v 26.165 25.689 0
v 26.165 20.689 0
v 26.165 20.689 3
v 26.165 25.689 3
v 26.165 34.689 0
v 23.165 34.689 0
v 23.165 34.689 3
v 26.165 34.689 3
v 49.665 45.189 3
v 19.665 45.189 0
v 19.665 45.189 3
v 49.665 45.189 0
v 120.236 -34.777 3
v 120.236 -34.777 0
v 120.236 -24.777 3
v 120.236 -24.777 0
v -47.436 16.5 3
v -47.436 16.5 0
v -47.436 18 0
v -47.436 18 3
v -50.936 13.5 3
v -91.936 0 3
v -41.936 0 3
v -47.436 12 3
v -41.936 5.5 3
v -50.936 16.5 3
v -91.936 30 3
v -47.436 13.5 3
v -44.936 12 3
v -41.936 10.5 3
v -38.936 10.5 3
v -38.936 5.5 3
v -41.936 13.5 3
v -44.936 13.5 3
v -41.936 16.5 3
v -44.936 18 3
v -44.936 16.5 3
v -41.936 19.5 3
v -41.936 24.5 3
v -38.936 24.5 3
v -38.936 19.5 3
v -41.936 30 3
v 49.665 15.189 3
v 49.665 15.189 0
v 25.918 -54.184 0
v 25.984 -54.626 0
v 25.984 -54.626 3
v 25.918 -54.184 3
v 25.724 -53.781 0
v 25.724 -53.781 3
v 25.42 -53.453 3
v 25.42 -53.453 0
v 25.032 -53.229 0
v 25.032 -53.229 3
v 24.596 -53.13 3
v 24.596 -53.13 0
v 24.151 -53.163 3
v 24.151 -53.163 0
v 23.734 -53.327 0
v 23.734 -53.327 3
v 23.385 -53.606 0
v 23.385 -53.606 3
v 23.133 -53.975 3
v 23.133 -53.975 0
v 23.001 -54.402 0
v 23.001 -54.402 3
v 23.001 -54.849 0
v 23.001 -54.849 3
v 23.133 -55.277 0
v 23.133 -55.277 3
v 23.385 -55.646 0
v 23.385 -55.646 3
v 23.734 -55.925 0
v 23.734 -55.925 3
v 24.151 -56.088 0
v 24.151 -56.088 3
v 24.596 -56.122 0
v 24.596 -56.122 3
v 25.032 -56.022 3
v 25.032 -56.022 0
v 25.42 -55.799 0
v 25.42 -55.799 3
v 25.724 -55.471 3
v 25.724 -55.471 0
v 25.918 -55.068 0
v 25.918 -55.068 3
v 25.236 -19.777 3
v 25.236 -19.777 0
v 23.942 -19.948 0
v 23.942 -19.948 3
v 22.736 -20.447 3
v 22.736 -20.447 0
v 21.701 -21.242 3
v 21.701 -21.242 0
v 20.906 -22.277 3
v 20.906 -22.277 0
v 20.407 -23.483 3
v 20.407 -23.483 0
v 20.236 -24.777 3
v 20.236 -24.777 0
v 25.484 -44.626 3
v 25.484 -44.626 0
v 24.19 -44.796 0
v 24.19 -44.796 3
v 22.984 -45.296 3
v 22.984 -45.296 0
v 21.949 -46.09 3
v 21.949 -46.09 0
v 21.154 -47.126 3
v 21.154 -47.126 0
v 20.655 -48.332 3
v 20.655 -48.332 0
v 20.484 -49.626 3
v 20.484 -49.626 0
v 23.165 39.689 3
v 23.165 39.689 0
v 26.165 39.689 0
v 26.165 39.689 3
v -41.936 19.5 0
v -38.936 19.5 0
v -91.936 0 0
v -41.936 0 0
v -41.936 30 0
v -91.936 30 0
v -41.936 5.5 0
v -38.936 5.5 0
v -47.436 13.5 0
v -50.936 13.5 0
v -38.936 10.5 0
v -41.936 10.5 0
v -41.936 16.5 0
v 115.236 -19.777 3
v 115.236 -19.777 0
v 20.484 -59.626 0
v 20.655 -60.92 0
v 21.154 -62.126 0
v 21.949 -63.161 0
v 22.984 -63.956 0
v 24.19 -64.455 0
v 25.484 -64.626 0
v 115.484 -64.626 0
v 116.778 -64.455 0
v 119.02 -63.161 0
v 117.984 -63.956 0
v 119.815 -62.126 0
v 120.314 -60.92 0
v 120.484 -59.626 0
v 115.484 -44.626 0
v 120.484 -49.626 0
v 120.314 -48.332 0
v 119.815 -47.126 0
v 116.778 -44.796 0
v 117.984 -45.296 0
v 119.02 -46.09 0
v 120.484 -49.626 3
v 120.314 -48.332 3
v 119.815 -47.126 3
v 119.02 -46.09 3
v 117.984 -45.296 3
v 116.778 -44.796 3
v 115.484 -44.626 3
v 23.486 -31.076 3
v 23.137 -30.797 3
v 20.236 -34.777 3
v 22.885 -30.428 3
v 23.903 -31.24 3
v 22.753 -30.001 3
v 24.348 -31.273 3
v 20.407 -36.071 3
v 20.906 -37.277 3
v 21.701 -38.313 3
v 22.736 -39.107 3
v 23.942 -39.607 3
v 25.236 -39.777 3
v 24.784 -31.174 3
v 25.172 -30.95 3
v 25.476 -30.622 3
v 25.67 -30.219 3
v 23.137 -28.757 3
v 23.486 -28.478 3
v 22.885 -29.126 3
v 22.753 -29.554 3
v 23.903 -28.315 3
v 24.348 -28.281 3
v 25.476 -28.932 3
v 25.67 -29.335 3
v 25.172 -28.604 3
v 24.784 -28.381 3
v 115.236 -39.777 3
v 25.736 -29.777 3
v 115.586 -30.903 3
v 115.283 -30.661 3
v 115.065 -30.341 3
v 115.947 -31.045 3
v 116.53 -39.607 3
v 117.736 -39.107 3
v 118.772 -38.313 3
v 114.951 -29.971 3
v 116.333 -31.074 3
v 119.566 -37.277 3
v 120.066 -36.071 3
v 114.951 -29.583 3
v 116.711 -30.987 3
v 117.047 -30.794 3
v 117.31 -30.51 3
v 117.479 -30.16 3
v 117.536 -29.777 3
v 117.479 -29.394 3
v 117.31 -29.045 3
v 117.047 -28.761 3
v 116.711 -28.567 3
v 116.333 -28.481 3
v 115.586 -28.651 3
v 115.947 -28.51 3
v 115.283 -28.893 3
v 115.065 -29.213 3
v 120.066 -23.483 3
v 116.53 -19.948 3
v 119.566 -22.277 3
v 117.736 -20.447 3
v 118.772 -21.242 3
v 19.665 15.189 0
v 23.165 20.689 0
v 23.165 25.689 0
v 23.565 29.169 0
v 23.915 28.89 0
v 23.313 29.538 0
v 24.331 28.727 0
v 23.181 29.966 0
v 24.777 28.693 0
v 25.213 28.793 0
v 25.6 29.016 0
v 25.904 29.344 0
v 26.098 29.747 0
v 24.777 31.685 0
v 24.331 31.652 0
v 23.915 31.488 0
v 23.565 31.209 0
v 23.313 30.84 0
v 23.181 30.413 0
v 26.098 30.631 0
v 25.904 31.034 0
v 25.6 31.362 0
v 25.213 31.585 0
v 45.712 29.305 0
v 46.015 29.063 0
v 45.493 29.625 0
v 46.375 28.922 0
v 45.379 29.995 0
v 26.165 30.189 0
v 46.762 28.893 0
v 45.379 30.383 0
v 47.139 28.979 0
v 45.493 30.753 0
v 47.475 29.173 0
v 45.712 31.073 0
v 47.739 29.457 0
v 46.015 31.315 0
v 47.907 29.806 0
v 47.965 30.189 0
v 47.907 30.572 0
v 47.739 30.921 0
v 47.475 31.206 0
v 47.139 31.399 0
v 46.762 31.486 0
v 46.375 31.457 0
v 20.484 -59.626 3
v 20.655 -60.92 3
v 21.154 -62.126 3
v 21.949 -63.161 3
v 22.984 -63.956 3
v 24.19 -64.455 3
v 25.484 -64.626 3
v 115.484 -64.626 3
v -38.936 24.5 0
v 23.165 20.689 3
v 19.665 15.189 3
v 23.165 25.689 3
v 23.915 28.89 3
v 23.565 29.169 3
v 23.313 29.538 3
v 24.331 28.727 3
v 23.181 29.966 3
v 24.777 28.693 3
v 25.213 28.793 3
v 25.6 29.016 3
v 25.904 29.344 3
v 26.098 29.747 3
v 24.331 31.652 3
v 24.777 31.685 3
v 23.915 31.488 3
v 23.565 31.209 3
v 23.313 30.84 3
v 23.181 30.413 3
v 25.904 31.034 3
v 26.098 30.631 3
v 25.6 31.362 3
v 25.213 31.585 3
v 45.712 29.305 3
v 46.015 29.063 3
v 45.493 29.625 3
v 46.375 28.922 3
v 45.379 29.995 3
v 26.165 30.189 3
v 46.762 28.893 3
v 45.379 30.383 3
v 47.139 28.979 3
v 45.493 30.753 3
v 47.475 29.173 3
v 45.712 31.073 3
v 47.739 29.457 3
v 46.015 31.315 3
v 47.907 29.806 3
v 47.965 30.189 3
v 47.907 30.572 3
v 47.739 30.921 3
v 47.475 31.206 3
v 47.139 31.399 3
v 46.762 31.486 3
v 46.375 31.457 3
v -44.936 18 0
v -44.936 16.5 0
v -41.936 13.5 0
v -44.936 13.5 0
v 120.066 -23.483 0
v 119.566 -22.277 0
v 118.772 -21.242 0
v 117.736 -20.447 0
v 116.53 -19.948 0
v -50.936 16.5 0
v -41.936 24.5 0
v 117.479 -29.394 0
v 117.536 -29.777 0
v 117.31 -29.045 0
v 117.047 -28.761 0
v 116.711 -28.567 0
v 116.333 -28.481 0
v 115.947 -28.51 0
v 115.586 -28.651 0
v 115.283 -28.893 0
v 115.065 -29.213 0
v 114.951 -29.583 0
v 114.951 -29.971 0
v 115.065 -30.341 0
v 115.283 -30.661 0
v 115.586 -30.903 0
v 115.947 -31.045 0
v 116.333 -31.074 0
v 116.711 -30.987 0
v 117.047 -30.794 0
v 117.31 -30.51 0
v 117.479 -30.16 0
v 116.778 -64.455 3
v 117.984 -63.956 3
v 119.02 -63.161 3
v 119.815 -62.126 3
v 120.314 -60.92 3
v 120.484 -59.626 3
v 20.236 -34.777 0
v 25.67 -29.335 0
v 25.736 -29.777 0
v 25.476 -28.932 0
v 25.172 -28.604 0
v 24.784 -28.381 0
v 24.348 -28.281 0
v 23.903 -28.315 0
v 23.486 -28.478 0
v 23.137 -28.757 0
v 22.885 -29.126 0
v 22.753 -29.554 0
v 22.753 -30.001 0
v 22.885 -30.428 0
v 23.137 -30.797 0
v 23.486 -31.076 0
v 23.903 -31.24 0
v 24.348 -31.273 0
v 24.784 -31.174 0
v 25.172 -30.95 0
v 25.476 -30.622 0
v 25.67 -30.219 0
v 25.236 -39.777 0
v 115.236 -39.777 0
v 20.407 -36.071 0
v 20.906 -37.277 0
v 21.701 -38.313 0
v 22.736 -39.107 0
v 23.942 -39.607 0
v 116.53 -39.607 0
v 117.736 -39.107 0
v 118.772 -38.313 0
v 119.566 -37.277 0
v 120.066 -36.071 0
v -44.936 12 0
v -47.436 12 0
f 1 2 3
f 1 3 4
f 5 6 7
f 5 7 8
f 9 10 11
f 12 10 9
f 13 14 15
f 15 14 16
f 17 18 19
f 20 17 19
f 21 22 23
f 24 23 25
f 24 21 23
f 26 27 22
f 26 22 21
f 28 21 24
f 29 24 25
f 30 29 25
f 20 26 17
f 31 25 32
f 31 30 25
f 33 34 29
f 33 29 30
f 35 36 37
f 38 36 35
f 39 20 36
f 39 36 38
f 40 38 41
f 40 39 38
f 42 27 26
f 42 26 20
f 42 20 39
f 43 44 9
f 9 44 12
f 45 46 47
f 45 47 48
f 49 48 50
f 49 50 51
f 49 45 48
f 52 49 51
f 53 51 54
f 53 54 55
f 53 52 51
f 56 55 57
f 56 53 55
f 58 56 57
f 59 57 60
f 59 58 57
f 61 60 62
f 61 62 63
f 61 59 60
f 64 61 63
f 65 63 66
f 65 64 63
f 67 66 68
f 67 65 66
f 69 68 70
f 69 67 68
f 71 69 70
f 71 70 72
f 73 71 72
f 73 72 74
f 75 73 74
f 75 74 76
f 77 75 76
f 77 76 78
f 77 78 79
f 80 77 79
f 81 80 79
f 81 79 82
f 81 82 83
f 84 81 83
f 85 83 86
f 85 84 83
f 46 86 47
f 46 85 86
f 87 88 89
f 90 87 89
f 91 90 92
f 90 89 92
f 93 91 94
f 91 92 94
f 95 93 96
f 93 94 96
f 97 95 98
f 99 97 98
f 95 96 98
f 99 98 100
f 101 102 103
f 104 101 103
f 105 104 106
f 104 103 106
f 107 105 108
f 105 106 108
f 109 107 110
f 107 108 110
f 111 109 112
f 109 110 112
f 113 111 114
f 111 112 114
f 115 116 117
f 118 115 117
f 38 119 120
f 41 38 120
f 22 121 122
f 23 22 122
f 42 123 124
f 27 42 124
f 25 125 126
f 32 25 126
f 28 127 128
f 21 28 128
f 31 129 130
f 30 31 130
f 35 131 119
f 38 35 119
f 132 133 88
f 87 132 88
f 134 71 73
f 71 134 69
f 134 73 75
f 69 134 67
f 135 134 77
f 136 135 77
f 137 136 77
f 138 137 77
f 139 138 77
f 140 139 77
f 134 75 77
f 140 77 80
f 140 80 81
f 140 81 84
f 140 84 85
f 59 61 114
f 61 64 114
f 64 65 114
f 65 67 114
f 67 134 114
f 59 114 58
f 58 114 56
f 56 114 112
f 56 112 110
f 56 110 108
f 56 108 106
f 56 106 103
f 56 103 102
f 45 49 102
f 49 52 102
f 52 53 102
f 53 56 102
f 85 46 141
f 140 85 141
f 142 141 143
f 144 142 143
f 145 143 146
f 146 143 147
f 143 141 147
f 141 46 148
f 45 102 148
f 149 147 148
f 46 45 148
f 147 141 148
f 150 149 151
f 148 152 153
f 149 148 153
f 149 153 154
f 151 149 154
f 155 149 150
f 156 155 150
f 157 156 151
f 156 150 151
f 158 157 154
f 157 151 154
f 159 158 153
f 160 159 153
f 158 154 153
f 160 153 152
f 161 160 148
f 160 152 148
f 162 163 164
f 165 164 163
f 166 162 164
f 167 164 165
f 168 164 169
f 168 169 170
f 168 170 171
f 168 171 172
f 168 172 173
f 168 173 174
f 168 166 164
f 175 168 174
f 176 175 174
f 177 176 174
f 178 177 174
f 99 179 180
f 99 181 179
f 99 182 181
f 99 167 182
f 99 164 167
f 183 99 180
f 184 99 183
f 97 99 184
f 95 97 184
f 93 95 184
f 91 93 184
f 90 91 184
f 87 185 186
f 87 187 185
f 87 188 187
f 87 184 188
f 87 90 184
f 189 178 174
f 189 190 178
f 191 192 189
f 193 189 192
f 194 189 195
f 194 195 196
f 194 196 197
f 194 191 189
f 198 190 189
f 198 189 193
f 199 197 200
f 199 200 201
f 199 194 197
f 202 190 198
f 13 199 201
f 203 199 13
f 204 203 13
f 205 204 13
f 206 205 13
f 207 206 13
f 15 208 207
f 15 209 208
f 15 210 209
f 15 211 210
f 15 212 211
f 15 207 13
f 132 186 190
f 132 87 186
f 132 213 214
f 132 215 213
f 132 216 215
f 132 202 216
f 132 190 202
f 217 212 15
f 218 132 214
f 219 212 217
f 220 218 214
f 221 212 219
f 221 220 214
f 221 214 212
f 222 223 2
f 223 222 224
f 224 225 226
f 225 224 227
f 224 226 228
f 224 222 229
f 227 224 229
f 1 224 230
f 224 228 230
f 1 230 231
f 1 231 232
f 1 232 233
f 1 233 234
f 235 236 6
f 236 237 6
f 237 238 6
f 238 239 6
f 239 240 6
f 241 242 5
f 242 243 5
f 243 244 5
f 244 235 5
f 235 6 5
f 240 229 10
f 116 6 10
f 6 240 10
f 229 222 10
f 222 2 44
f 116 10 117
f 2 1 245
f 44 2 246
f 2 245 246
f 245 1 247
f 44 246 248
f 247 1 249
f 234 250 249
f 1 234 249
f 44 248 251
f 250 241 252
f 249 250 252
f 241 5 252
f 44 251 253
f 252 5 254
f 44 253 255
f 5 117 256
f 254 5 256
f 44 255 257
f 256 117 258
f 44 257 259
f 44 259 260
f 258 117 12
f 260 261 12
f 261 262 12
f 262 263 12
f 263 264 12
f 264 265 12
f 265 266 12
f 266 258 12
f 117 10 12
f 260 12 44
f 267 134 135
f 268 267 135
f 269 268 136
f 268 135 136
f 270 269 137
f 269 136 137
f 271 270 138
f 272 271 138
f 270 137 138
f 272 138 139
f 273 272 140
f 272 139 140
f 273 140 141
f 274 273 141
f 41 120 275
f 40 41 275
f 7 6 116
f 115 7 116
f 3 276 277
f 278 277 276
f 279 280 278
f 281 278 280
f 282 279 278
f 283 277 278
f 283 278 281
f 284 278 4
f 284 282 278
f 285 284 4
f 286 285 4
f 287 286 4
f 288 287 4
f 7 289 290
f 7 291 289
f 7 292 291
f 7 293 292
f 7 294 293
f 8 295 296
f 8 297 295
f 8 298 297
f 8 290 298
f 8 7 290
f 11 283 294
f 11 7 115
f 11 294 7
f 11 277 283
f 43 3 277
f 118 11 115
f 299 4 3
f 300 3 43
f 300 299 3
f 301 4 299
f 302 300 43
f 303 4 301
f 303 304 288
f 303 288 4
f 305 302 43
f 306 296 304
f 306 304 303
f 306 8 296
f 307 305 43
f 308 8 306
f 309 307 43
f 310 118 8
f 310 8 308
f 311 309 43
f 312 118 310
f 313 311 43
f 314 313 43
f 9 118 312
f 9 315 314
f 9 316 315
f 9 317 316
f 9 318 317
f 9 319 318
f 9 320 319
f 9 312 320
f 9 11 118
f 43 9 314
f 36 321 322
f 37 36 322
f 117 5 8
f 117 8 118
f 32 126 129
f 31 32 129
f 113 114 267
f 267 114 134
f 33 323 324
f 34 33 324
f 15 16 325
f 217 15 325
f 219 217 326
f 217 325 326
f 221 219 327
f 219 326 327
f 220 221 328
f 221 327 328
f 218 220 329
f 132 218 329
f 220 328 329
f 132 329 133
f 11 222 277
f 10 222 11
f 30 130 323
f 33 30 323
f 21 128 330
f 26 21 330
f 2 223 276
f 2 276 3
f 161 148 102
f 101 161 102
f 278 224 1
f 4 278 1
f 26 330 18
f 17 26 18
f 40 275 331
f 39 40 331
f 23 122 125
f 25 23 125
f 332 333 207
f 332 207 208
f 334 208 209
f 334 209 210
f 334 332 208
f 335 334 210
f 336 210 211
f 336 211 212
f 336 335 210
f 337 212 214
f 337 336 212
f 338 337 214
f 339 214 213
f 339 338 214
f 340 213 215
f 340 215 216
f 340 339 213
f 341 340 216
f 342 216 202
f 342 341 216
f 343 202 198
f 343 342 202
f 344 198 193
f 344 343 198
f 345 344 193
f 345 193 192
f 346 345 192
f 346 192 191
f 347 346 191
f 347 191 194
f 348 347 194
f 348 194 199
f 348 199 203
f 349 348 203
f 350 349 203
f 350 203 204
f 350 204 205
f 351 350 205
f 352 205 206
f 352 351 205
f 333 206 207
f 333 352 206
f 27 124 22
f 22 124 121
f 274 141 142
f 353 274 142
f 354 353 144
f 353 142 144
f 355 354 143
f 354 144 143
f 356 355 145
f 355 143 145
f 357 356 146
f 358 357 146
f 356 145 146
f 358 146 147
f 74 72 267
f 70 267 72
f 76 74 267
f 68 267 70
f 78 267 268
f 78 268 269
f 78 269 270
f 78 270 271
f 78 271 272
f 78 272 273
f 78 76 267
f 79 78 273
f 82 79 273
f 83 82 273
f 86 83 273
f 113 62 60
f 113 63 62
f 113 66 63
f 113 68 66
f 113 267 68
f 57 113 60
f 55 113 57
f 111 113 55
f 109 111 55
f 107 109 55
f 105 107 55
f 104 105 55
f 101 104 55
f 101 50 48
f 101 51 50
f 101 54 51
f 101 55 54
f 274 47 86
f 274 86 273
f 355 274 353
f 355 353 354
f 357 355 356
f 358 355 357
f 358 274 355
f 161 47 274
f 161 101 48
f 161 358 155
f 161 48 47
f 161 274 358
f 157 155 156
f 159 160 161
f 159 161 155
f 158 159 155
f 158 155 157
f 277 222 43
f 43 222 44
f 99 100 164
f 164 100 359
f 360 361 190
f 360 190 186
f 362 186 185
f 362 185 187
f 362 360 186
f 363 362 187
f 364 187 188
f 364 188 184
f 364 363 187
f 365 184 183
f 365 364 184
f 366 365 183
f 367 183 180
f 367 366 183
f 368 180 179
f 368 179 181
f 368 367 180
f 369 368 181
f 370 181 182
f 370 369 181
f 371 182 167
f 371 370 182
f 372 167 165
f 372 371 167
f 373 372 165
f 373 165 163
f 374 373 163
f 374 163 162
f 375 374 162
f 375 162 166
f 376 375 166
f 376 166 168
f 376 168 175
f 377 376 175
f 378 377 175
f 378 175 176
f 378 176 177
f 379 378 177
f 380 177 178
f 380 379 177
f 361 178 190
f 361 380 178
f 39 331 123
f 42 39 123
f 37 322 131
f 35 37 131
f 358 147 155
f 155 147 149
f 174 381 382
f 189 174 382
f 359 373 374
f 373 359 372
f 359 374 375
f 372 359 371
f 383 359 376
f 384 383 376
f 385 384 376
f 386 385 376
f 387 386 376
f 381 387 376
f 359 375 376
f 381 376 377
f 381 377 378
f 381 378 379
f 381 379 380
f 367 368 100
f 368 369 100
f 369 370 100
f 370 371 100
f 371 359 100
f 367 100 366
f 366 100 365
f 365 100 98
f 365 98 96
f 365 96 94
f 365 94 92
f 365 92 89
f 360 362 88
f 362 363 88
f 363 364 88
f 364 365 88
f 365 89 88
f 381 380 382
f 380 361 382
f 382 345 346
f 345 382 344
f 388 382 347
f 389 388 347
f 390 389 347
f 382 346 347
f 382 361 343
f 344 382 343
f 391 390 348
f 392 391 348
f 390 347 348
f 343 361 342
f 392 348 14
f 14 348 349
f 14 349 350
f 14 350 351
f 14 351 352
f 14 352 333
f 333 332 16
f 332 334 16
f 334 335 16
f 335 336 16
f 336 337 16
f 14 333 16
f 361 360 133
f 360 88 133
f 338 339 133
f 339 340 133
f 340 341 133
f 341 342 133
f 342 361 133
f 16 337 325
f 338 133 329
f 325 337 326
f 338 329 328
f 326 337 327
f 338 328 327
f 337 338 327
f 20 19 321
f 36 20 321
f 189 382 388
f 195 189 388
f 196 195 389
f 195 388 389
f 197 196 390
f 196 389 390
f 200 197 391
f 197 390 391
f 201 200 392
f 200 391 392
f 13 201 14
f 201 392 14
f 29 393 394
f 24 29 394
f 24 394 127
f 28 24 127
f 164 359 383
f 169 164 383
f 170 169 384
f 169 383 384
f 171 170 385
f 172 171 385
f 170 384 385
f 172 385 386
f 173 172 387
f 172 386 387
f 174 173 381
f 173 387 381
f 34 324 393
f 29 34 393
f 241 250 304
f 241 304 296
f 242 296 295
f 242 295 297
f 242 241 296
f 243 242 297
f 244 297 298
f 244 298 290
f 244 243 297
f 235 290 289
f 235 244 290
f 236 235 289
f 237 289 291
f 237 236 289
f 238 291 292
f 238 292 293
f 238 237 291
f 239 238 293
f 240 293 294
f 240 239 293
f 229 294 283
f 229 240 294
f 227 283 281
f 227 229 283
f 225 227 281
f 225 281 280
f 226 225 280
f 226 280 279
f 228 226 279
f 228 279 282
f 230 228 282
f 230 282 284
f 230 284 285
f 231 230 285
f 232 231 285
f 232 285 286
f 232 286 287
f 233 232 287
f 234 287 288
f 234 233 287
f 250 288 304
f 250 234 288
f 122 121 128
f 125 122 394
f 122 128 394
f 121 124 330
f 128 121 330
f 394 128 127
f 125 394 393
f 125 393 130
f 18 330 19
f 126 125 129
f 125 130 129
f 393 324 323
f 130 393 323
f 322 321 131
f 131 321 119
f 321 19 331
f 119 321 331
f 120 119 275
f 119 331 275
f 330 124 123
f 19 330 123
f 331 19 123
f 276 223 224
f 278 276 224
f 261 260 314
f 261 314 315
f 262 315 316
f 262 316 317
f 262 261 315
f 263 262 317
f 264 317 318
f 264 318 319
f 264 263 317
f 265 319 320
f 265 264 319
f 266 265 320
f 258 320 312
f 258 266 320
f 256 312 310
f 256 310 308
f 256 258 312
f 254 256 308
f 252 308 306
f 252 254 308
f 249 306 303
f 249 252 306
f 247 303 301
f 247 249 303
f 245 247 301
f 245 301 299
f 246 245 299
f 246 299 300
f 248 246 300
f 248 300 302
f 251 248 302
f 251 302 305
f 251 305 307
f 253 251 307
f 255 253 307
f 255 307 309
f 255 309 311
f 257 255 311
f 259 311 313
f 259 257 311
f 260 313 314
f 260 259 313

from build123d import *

# Parameters (mm, degrees)
F2_DEPTH = 3
F1_W     = 30
F1_H     = 30
F1_W_2   = 3
F1_H_2   = 5
F1_R     = 1.5
F1_R_2   = 1.3
F3_DEPTH = 3
F4_R     = 1.5
F4_R_2   = 1.3
F5_DEPTH = 3
F6_DEPTH = 3


with BuildPart() as f2:
    # F0 (on Top) → F2 (new body)
    with BuildSketch(Plane.XY):
        Polygon((-38.935582, 24.5), (-41.935582, 24.5), (-41.935582, 30), (-91.935582, 30), (-91.935582, 0), (-41.935582, 0), (-41.935582, 5.5), (-38.935582, 5.5), (-38.935582, 10.5), (-41.935582, 10.5), (-41.935582, 13.5), (-44.935582, 13.5), (-44.935582, 12), (-47.435582, 12), (-47.435582, 13.5), (-50.935582, 13.5), (-50.935582, 16.5), (-47.435582, 16.5), (-47.435582, 18), (-44.935582, 18), (-44.935582, 16.5), (-41.935582, 16.5), (-41.935582, 19.5), (-38.935582, 19.5), align=None)
    extrude(amount=F2_DEPTH)


with BuildPart() as f3:
    # F1 (on Top) → F3 (new body)
    with BuildSketch(Plane.XY):
        with Locations((34.664549, 30.189171)):
            Rectangle(F1_W, F1_H)
        with Locations((24.664549, 23.189171)):
            Rectangle(F1_W_2, F1_H_2, mode=Mode.SUBTRACT)
        with Locations((24.664549, 30.189171)):
            Circle(F1_R, mode=Mode.SUBTRACT)
        with Locations((46.664549, 30.189171)):
            Circle(F1_R_2, mode=Mode.SUBTRACT)
        with Locations((24.664549, 37.189171)):
            Rectangle(F1_W_2, F1_H_2, mode=Mode.SUBTRACT)
    extrude(amount=F3_DEPTH)


with BuildPart() as f5:
    # F4 (on Top) → F5 (new body)
    with BuildSketch(Plane.XY):
        with BuildLine():
            Line((115.236325, -19.777222), (25.236325, -19.777222))
            ThreePointArc((25.236325, -19.777222), (21.700791, -21.241688), (20.236325, -24.777222))
            Line((20.236325, -24.777222), (20.236325, -34.777222))
            ThreePointArc((20.236325, -34.777222), (21.700791, -38.312756), (25.236325, -39.777222))
            Line((25.236325, -39.777222), (115.236325, -39.777222))
            ThreePointArc((115.236325, -39.777222), (118.771859, -38.312756), (120.236325, -34.777222))
            Line((120.236325, -34.777222), (120.236325, -24.777222))
            ThreePointArc((120.236325, -24.777222), (118.771859, -21.241688), (115.236325, -19.777222))
        make_face()
        with Locations((24.236325, -29.777222)):
            Circle(F4_R, mode=Mode.SUBTRACT)
        with Locations((116.236325, -29.777222)):
            Circle(F4_R_2, mode=Mode.SUBTRACT)
    extrude(amount=F5_DEPTH)


with BuildPart() as f6:
    # F4 (on Top) → F6 (new body)
    with BuildSketch(Plane.XY):
        with BuildLine():
            Line((115.484388, -44.625802), (25.484388, -44.625802))
            ThreePointArc((25.484388, -44.625802), (21.948854, -46.090269), (20.484388, -49.625802))
            Line((20.484388, -49.625802), (20.484388, -59.625802))
            ThreePointArc((20.484388, -59.625802), (21.948854, -63.161336), (25.484388, -64.625802))
            Line((25.484388, -64.625802), (115.484388, -64.625802))
            ThreePointArc((115.484388, -64.625802), (119.019922, -63.161336), (120.484388, -59.625802))
            Line((120.484388, -59.625802), (120.484388, -49.625802))
            ThreePointArc((120.484388, -49.625802), (119.019922, -46.090269), (115.484388, -44.625802))
        make_face()
        with Locations((24.484388, -54.625802)):
            Circle(F4_R, mode=Mode.SUBTRACT)
    extrude(amount=F6_DEPTH)


solid = Compound([f2.part, f3.part, f5.part, f6.part])
